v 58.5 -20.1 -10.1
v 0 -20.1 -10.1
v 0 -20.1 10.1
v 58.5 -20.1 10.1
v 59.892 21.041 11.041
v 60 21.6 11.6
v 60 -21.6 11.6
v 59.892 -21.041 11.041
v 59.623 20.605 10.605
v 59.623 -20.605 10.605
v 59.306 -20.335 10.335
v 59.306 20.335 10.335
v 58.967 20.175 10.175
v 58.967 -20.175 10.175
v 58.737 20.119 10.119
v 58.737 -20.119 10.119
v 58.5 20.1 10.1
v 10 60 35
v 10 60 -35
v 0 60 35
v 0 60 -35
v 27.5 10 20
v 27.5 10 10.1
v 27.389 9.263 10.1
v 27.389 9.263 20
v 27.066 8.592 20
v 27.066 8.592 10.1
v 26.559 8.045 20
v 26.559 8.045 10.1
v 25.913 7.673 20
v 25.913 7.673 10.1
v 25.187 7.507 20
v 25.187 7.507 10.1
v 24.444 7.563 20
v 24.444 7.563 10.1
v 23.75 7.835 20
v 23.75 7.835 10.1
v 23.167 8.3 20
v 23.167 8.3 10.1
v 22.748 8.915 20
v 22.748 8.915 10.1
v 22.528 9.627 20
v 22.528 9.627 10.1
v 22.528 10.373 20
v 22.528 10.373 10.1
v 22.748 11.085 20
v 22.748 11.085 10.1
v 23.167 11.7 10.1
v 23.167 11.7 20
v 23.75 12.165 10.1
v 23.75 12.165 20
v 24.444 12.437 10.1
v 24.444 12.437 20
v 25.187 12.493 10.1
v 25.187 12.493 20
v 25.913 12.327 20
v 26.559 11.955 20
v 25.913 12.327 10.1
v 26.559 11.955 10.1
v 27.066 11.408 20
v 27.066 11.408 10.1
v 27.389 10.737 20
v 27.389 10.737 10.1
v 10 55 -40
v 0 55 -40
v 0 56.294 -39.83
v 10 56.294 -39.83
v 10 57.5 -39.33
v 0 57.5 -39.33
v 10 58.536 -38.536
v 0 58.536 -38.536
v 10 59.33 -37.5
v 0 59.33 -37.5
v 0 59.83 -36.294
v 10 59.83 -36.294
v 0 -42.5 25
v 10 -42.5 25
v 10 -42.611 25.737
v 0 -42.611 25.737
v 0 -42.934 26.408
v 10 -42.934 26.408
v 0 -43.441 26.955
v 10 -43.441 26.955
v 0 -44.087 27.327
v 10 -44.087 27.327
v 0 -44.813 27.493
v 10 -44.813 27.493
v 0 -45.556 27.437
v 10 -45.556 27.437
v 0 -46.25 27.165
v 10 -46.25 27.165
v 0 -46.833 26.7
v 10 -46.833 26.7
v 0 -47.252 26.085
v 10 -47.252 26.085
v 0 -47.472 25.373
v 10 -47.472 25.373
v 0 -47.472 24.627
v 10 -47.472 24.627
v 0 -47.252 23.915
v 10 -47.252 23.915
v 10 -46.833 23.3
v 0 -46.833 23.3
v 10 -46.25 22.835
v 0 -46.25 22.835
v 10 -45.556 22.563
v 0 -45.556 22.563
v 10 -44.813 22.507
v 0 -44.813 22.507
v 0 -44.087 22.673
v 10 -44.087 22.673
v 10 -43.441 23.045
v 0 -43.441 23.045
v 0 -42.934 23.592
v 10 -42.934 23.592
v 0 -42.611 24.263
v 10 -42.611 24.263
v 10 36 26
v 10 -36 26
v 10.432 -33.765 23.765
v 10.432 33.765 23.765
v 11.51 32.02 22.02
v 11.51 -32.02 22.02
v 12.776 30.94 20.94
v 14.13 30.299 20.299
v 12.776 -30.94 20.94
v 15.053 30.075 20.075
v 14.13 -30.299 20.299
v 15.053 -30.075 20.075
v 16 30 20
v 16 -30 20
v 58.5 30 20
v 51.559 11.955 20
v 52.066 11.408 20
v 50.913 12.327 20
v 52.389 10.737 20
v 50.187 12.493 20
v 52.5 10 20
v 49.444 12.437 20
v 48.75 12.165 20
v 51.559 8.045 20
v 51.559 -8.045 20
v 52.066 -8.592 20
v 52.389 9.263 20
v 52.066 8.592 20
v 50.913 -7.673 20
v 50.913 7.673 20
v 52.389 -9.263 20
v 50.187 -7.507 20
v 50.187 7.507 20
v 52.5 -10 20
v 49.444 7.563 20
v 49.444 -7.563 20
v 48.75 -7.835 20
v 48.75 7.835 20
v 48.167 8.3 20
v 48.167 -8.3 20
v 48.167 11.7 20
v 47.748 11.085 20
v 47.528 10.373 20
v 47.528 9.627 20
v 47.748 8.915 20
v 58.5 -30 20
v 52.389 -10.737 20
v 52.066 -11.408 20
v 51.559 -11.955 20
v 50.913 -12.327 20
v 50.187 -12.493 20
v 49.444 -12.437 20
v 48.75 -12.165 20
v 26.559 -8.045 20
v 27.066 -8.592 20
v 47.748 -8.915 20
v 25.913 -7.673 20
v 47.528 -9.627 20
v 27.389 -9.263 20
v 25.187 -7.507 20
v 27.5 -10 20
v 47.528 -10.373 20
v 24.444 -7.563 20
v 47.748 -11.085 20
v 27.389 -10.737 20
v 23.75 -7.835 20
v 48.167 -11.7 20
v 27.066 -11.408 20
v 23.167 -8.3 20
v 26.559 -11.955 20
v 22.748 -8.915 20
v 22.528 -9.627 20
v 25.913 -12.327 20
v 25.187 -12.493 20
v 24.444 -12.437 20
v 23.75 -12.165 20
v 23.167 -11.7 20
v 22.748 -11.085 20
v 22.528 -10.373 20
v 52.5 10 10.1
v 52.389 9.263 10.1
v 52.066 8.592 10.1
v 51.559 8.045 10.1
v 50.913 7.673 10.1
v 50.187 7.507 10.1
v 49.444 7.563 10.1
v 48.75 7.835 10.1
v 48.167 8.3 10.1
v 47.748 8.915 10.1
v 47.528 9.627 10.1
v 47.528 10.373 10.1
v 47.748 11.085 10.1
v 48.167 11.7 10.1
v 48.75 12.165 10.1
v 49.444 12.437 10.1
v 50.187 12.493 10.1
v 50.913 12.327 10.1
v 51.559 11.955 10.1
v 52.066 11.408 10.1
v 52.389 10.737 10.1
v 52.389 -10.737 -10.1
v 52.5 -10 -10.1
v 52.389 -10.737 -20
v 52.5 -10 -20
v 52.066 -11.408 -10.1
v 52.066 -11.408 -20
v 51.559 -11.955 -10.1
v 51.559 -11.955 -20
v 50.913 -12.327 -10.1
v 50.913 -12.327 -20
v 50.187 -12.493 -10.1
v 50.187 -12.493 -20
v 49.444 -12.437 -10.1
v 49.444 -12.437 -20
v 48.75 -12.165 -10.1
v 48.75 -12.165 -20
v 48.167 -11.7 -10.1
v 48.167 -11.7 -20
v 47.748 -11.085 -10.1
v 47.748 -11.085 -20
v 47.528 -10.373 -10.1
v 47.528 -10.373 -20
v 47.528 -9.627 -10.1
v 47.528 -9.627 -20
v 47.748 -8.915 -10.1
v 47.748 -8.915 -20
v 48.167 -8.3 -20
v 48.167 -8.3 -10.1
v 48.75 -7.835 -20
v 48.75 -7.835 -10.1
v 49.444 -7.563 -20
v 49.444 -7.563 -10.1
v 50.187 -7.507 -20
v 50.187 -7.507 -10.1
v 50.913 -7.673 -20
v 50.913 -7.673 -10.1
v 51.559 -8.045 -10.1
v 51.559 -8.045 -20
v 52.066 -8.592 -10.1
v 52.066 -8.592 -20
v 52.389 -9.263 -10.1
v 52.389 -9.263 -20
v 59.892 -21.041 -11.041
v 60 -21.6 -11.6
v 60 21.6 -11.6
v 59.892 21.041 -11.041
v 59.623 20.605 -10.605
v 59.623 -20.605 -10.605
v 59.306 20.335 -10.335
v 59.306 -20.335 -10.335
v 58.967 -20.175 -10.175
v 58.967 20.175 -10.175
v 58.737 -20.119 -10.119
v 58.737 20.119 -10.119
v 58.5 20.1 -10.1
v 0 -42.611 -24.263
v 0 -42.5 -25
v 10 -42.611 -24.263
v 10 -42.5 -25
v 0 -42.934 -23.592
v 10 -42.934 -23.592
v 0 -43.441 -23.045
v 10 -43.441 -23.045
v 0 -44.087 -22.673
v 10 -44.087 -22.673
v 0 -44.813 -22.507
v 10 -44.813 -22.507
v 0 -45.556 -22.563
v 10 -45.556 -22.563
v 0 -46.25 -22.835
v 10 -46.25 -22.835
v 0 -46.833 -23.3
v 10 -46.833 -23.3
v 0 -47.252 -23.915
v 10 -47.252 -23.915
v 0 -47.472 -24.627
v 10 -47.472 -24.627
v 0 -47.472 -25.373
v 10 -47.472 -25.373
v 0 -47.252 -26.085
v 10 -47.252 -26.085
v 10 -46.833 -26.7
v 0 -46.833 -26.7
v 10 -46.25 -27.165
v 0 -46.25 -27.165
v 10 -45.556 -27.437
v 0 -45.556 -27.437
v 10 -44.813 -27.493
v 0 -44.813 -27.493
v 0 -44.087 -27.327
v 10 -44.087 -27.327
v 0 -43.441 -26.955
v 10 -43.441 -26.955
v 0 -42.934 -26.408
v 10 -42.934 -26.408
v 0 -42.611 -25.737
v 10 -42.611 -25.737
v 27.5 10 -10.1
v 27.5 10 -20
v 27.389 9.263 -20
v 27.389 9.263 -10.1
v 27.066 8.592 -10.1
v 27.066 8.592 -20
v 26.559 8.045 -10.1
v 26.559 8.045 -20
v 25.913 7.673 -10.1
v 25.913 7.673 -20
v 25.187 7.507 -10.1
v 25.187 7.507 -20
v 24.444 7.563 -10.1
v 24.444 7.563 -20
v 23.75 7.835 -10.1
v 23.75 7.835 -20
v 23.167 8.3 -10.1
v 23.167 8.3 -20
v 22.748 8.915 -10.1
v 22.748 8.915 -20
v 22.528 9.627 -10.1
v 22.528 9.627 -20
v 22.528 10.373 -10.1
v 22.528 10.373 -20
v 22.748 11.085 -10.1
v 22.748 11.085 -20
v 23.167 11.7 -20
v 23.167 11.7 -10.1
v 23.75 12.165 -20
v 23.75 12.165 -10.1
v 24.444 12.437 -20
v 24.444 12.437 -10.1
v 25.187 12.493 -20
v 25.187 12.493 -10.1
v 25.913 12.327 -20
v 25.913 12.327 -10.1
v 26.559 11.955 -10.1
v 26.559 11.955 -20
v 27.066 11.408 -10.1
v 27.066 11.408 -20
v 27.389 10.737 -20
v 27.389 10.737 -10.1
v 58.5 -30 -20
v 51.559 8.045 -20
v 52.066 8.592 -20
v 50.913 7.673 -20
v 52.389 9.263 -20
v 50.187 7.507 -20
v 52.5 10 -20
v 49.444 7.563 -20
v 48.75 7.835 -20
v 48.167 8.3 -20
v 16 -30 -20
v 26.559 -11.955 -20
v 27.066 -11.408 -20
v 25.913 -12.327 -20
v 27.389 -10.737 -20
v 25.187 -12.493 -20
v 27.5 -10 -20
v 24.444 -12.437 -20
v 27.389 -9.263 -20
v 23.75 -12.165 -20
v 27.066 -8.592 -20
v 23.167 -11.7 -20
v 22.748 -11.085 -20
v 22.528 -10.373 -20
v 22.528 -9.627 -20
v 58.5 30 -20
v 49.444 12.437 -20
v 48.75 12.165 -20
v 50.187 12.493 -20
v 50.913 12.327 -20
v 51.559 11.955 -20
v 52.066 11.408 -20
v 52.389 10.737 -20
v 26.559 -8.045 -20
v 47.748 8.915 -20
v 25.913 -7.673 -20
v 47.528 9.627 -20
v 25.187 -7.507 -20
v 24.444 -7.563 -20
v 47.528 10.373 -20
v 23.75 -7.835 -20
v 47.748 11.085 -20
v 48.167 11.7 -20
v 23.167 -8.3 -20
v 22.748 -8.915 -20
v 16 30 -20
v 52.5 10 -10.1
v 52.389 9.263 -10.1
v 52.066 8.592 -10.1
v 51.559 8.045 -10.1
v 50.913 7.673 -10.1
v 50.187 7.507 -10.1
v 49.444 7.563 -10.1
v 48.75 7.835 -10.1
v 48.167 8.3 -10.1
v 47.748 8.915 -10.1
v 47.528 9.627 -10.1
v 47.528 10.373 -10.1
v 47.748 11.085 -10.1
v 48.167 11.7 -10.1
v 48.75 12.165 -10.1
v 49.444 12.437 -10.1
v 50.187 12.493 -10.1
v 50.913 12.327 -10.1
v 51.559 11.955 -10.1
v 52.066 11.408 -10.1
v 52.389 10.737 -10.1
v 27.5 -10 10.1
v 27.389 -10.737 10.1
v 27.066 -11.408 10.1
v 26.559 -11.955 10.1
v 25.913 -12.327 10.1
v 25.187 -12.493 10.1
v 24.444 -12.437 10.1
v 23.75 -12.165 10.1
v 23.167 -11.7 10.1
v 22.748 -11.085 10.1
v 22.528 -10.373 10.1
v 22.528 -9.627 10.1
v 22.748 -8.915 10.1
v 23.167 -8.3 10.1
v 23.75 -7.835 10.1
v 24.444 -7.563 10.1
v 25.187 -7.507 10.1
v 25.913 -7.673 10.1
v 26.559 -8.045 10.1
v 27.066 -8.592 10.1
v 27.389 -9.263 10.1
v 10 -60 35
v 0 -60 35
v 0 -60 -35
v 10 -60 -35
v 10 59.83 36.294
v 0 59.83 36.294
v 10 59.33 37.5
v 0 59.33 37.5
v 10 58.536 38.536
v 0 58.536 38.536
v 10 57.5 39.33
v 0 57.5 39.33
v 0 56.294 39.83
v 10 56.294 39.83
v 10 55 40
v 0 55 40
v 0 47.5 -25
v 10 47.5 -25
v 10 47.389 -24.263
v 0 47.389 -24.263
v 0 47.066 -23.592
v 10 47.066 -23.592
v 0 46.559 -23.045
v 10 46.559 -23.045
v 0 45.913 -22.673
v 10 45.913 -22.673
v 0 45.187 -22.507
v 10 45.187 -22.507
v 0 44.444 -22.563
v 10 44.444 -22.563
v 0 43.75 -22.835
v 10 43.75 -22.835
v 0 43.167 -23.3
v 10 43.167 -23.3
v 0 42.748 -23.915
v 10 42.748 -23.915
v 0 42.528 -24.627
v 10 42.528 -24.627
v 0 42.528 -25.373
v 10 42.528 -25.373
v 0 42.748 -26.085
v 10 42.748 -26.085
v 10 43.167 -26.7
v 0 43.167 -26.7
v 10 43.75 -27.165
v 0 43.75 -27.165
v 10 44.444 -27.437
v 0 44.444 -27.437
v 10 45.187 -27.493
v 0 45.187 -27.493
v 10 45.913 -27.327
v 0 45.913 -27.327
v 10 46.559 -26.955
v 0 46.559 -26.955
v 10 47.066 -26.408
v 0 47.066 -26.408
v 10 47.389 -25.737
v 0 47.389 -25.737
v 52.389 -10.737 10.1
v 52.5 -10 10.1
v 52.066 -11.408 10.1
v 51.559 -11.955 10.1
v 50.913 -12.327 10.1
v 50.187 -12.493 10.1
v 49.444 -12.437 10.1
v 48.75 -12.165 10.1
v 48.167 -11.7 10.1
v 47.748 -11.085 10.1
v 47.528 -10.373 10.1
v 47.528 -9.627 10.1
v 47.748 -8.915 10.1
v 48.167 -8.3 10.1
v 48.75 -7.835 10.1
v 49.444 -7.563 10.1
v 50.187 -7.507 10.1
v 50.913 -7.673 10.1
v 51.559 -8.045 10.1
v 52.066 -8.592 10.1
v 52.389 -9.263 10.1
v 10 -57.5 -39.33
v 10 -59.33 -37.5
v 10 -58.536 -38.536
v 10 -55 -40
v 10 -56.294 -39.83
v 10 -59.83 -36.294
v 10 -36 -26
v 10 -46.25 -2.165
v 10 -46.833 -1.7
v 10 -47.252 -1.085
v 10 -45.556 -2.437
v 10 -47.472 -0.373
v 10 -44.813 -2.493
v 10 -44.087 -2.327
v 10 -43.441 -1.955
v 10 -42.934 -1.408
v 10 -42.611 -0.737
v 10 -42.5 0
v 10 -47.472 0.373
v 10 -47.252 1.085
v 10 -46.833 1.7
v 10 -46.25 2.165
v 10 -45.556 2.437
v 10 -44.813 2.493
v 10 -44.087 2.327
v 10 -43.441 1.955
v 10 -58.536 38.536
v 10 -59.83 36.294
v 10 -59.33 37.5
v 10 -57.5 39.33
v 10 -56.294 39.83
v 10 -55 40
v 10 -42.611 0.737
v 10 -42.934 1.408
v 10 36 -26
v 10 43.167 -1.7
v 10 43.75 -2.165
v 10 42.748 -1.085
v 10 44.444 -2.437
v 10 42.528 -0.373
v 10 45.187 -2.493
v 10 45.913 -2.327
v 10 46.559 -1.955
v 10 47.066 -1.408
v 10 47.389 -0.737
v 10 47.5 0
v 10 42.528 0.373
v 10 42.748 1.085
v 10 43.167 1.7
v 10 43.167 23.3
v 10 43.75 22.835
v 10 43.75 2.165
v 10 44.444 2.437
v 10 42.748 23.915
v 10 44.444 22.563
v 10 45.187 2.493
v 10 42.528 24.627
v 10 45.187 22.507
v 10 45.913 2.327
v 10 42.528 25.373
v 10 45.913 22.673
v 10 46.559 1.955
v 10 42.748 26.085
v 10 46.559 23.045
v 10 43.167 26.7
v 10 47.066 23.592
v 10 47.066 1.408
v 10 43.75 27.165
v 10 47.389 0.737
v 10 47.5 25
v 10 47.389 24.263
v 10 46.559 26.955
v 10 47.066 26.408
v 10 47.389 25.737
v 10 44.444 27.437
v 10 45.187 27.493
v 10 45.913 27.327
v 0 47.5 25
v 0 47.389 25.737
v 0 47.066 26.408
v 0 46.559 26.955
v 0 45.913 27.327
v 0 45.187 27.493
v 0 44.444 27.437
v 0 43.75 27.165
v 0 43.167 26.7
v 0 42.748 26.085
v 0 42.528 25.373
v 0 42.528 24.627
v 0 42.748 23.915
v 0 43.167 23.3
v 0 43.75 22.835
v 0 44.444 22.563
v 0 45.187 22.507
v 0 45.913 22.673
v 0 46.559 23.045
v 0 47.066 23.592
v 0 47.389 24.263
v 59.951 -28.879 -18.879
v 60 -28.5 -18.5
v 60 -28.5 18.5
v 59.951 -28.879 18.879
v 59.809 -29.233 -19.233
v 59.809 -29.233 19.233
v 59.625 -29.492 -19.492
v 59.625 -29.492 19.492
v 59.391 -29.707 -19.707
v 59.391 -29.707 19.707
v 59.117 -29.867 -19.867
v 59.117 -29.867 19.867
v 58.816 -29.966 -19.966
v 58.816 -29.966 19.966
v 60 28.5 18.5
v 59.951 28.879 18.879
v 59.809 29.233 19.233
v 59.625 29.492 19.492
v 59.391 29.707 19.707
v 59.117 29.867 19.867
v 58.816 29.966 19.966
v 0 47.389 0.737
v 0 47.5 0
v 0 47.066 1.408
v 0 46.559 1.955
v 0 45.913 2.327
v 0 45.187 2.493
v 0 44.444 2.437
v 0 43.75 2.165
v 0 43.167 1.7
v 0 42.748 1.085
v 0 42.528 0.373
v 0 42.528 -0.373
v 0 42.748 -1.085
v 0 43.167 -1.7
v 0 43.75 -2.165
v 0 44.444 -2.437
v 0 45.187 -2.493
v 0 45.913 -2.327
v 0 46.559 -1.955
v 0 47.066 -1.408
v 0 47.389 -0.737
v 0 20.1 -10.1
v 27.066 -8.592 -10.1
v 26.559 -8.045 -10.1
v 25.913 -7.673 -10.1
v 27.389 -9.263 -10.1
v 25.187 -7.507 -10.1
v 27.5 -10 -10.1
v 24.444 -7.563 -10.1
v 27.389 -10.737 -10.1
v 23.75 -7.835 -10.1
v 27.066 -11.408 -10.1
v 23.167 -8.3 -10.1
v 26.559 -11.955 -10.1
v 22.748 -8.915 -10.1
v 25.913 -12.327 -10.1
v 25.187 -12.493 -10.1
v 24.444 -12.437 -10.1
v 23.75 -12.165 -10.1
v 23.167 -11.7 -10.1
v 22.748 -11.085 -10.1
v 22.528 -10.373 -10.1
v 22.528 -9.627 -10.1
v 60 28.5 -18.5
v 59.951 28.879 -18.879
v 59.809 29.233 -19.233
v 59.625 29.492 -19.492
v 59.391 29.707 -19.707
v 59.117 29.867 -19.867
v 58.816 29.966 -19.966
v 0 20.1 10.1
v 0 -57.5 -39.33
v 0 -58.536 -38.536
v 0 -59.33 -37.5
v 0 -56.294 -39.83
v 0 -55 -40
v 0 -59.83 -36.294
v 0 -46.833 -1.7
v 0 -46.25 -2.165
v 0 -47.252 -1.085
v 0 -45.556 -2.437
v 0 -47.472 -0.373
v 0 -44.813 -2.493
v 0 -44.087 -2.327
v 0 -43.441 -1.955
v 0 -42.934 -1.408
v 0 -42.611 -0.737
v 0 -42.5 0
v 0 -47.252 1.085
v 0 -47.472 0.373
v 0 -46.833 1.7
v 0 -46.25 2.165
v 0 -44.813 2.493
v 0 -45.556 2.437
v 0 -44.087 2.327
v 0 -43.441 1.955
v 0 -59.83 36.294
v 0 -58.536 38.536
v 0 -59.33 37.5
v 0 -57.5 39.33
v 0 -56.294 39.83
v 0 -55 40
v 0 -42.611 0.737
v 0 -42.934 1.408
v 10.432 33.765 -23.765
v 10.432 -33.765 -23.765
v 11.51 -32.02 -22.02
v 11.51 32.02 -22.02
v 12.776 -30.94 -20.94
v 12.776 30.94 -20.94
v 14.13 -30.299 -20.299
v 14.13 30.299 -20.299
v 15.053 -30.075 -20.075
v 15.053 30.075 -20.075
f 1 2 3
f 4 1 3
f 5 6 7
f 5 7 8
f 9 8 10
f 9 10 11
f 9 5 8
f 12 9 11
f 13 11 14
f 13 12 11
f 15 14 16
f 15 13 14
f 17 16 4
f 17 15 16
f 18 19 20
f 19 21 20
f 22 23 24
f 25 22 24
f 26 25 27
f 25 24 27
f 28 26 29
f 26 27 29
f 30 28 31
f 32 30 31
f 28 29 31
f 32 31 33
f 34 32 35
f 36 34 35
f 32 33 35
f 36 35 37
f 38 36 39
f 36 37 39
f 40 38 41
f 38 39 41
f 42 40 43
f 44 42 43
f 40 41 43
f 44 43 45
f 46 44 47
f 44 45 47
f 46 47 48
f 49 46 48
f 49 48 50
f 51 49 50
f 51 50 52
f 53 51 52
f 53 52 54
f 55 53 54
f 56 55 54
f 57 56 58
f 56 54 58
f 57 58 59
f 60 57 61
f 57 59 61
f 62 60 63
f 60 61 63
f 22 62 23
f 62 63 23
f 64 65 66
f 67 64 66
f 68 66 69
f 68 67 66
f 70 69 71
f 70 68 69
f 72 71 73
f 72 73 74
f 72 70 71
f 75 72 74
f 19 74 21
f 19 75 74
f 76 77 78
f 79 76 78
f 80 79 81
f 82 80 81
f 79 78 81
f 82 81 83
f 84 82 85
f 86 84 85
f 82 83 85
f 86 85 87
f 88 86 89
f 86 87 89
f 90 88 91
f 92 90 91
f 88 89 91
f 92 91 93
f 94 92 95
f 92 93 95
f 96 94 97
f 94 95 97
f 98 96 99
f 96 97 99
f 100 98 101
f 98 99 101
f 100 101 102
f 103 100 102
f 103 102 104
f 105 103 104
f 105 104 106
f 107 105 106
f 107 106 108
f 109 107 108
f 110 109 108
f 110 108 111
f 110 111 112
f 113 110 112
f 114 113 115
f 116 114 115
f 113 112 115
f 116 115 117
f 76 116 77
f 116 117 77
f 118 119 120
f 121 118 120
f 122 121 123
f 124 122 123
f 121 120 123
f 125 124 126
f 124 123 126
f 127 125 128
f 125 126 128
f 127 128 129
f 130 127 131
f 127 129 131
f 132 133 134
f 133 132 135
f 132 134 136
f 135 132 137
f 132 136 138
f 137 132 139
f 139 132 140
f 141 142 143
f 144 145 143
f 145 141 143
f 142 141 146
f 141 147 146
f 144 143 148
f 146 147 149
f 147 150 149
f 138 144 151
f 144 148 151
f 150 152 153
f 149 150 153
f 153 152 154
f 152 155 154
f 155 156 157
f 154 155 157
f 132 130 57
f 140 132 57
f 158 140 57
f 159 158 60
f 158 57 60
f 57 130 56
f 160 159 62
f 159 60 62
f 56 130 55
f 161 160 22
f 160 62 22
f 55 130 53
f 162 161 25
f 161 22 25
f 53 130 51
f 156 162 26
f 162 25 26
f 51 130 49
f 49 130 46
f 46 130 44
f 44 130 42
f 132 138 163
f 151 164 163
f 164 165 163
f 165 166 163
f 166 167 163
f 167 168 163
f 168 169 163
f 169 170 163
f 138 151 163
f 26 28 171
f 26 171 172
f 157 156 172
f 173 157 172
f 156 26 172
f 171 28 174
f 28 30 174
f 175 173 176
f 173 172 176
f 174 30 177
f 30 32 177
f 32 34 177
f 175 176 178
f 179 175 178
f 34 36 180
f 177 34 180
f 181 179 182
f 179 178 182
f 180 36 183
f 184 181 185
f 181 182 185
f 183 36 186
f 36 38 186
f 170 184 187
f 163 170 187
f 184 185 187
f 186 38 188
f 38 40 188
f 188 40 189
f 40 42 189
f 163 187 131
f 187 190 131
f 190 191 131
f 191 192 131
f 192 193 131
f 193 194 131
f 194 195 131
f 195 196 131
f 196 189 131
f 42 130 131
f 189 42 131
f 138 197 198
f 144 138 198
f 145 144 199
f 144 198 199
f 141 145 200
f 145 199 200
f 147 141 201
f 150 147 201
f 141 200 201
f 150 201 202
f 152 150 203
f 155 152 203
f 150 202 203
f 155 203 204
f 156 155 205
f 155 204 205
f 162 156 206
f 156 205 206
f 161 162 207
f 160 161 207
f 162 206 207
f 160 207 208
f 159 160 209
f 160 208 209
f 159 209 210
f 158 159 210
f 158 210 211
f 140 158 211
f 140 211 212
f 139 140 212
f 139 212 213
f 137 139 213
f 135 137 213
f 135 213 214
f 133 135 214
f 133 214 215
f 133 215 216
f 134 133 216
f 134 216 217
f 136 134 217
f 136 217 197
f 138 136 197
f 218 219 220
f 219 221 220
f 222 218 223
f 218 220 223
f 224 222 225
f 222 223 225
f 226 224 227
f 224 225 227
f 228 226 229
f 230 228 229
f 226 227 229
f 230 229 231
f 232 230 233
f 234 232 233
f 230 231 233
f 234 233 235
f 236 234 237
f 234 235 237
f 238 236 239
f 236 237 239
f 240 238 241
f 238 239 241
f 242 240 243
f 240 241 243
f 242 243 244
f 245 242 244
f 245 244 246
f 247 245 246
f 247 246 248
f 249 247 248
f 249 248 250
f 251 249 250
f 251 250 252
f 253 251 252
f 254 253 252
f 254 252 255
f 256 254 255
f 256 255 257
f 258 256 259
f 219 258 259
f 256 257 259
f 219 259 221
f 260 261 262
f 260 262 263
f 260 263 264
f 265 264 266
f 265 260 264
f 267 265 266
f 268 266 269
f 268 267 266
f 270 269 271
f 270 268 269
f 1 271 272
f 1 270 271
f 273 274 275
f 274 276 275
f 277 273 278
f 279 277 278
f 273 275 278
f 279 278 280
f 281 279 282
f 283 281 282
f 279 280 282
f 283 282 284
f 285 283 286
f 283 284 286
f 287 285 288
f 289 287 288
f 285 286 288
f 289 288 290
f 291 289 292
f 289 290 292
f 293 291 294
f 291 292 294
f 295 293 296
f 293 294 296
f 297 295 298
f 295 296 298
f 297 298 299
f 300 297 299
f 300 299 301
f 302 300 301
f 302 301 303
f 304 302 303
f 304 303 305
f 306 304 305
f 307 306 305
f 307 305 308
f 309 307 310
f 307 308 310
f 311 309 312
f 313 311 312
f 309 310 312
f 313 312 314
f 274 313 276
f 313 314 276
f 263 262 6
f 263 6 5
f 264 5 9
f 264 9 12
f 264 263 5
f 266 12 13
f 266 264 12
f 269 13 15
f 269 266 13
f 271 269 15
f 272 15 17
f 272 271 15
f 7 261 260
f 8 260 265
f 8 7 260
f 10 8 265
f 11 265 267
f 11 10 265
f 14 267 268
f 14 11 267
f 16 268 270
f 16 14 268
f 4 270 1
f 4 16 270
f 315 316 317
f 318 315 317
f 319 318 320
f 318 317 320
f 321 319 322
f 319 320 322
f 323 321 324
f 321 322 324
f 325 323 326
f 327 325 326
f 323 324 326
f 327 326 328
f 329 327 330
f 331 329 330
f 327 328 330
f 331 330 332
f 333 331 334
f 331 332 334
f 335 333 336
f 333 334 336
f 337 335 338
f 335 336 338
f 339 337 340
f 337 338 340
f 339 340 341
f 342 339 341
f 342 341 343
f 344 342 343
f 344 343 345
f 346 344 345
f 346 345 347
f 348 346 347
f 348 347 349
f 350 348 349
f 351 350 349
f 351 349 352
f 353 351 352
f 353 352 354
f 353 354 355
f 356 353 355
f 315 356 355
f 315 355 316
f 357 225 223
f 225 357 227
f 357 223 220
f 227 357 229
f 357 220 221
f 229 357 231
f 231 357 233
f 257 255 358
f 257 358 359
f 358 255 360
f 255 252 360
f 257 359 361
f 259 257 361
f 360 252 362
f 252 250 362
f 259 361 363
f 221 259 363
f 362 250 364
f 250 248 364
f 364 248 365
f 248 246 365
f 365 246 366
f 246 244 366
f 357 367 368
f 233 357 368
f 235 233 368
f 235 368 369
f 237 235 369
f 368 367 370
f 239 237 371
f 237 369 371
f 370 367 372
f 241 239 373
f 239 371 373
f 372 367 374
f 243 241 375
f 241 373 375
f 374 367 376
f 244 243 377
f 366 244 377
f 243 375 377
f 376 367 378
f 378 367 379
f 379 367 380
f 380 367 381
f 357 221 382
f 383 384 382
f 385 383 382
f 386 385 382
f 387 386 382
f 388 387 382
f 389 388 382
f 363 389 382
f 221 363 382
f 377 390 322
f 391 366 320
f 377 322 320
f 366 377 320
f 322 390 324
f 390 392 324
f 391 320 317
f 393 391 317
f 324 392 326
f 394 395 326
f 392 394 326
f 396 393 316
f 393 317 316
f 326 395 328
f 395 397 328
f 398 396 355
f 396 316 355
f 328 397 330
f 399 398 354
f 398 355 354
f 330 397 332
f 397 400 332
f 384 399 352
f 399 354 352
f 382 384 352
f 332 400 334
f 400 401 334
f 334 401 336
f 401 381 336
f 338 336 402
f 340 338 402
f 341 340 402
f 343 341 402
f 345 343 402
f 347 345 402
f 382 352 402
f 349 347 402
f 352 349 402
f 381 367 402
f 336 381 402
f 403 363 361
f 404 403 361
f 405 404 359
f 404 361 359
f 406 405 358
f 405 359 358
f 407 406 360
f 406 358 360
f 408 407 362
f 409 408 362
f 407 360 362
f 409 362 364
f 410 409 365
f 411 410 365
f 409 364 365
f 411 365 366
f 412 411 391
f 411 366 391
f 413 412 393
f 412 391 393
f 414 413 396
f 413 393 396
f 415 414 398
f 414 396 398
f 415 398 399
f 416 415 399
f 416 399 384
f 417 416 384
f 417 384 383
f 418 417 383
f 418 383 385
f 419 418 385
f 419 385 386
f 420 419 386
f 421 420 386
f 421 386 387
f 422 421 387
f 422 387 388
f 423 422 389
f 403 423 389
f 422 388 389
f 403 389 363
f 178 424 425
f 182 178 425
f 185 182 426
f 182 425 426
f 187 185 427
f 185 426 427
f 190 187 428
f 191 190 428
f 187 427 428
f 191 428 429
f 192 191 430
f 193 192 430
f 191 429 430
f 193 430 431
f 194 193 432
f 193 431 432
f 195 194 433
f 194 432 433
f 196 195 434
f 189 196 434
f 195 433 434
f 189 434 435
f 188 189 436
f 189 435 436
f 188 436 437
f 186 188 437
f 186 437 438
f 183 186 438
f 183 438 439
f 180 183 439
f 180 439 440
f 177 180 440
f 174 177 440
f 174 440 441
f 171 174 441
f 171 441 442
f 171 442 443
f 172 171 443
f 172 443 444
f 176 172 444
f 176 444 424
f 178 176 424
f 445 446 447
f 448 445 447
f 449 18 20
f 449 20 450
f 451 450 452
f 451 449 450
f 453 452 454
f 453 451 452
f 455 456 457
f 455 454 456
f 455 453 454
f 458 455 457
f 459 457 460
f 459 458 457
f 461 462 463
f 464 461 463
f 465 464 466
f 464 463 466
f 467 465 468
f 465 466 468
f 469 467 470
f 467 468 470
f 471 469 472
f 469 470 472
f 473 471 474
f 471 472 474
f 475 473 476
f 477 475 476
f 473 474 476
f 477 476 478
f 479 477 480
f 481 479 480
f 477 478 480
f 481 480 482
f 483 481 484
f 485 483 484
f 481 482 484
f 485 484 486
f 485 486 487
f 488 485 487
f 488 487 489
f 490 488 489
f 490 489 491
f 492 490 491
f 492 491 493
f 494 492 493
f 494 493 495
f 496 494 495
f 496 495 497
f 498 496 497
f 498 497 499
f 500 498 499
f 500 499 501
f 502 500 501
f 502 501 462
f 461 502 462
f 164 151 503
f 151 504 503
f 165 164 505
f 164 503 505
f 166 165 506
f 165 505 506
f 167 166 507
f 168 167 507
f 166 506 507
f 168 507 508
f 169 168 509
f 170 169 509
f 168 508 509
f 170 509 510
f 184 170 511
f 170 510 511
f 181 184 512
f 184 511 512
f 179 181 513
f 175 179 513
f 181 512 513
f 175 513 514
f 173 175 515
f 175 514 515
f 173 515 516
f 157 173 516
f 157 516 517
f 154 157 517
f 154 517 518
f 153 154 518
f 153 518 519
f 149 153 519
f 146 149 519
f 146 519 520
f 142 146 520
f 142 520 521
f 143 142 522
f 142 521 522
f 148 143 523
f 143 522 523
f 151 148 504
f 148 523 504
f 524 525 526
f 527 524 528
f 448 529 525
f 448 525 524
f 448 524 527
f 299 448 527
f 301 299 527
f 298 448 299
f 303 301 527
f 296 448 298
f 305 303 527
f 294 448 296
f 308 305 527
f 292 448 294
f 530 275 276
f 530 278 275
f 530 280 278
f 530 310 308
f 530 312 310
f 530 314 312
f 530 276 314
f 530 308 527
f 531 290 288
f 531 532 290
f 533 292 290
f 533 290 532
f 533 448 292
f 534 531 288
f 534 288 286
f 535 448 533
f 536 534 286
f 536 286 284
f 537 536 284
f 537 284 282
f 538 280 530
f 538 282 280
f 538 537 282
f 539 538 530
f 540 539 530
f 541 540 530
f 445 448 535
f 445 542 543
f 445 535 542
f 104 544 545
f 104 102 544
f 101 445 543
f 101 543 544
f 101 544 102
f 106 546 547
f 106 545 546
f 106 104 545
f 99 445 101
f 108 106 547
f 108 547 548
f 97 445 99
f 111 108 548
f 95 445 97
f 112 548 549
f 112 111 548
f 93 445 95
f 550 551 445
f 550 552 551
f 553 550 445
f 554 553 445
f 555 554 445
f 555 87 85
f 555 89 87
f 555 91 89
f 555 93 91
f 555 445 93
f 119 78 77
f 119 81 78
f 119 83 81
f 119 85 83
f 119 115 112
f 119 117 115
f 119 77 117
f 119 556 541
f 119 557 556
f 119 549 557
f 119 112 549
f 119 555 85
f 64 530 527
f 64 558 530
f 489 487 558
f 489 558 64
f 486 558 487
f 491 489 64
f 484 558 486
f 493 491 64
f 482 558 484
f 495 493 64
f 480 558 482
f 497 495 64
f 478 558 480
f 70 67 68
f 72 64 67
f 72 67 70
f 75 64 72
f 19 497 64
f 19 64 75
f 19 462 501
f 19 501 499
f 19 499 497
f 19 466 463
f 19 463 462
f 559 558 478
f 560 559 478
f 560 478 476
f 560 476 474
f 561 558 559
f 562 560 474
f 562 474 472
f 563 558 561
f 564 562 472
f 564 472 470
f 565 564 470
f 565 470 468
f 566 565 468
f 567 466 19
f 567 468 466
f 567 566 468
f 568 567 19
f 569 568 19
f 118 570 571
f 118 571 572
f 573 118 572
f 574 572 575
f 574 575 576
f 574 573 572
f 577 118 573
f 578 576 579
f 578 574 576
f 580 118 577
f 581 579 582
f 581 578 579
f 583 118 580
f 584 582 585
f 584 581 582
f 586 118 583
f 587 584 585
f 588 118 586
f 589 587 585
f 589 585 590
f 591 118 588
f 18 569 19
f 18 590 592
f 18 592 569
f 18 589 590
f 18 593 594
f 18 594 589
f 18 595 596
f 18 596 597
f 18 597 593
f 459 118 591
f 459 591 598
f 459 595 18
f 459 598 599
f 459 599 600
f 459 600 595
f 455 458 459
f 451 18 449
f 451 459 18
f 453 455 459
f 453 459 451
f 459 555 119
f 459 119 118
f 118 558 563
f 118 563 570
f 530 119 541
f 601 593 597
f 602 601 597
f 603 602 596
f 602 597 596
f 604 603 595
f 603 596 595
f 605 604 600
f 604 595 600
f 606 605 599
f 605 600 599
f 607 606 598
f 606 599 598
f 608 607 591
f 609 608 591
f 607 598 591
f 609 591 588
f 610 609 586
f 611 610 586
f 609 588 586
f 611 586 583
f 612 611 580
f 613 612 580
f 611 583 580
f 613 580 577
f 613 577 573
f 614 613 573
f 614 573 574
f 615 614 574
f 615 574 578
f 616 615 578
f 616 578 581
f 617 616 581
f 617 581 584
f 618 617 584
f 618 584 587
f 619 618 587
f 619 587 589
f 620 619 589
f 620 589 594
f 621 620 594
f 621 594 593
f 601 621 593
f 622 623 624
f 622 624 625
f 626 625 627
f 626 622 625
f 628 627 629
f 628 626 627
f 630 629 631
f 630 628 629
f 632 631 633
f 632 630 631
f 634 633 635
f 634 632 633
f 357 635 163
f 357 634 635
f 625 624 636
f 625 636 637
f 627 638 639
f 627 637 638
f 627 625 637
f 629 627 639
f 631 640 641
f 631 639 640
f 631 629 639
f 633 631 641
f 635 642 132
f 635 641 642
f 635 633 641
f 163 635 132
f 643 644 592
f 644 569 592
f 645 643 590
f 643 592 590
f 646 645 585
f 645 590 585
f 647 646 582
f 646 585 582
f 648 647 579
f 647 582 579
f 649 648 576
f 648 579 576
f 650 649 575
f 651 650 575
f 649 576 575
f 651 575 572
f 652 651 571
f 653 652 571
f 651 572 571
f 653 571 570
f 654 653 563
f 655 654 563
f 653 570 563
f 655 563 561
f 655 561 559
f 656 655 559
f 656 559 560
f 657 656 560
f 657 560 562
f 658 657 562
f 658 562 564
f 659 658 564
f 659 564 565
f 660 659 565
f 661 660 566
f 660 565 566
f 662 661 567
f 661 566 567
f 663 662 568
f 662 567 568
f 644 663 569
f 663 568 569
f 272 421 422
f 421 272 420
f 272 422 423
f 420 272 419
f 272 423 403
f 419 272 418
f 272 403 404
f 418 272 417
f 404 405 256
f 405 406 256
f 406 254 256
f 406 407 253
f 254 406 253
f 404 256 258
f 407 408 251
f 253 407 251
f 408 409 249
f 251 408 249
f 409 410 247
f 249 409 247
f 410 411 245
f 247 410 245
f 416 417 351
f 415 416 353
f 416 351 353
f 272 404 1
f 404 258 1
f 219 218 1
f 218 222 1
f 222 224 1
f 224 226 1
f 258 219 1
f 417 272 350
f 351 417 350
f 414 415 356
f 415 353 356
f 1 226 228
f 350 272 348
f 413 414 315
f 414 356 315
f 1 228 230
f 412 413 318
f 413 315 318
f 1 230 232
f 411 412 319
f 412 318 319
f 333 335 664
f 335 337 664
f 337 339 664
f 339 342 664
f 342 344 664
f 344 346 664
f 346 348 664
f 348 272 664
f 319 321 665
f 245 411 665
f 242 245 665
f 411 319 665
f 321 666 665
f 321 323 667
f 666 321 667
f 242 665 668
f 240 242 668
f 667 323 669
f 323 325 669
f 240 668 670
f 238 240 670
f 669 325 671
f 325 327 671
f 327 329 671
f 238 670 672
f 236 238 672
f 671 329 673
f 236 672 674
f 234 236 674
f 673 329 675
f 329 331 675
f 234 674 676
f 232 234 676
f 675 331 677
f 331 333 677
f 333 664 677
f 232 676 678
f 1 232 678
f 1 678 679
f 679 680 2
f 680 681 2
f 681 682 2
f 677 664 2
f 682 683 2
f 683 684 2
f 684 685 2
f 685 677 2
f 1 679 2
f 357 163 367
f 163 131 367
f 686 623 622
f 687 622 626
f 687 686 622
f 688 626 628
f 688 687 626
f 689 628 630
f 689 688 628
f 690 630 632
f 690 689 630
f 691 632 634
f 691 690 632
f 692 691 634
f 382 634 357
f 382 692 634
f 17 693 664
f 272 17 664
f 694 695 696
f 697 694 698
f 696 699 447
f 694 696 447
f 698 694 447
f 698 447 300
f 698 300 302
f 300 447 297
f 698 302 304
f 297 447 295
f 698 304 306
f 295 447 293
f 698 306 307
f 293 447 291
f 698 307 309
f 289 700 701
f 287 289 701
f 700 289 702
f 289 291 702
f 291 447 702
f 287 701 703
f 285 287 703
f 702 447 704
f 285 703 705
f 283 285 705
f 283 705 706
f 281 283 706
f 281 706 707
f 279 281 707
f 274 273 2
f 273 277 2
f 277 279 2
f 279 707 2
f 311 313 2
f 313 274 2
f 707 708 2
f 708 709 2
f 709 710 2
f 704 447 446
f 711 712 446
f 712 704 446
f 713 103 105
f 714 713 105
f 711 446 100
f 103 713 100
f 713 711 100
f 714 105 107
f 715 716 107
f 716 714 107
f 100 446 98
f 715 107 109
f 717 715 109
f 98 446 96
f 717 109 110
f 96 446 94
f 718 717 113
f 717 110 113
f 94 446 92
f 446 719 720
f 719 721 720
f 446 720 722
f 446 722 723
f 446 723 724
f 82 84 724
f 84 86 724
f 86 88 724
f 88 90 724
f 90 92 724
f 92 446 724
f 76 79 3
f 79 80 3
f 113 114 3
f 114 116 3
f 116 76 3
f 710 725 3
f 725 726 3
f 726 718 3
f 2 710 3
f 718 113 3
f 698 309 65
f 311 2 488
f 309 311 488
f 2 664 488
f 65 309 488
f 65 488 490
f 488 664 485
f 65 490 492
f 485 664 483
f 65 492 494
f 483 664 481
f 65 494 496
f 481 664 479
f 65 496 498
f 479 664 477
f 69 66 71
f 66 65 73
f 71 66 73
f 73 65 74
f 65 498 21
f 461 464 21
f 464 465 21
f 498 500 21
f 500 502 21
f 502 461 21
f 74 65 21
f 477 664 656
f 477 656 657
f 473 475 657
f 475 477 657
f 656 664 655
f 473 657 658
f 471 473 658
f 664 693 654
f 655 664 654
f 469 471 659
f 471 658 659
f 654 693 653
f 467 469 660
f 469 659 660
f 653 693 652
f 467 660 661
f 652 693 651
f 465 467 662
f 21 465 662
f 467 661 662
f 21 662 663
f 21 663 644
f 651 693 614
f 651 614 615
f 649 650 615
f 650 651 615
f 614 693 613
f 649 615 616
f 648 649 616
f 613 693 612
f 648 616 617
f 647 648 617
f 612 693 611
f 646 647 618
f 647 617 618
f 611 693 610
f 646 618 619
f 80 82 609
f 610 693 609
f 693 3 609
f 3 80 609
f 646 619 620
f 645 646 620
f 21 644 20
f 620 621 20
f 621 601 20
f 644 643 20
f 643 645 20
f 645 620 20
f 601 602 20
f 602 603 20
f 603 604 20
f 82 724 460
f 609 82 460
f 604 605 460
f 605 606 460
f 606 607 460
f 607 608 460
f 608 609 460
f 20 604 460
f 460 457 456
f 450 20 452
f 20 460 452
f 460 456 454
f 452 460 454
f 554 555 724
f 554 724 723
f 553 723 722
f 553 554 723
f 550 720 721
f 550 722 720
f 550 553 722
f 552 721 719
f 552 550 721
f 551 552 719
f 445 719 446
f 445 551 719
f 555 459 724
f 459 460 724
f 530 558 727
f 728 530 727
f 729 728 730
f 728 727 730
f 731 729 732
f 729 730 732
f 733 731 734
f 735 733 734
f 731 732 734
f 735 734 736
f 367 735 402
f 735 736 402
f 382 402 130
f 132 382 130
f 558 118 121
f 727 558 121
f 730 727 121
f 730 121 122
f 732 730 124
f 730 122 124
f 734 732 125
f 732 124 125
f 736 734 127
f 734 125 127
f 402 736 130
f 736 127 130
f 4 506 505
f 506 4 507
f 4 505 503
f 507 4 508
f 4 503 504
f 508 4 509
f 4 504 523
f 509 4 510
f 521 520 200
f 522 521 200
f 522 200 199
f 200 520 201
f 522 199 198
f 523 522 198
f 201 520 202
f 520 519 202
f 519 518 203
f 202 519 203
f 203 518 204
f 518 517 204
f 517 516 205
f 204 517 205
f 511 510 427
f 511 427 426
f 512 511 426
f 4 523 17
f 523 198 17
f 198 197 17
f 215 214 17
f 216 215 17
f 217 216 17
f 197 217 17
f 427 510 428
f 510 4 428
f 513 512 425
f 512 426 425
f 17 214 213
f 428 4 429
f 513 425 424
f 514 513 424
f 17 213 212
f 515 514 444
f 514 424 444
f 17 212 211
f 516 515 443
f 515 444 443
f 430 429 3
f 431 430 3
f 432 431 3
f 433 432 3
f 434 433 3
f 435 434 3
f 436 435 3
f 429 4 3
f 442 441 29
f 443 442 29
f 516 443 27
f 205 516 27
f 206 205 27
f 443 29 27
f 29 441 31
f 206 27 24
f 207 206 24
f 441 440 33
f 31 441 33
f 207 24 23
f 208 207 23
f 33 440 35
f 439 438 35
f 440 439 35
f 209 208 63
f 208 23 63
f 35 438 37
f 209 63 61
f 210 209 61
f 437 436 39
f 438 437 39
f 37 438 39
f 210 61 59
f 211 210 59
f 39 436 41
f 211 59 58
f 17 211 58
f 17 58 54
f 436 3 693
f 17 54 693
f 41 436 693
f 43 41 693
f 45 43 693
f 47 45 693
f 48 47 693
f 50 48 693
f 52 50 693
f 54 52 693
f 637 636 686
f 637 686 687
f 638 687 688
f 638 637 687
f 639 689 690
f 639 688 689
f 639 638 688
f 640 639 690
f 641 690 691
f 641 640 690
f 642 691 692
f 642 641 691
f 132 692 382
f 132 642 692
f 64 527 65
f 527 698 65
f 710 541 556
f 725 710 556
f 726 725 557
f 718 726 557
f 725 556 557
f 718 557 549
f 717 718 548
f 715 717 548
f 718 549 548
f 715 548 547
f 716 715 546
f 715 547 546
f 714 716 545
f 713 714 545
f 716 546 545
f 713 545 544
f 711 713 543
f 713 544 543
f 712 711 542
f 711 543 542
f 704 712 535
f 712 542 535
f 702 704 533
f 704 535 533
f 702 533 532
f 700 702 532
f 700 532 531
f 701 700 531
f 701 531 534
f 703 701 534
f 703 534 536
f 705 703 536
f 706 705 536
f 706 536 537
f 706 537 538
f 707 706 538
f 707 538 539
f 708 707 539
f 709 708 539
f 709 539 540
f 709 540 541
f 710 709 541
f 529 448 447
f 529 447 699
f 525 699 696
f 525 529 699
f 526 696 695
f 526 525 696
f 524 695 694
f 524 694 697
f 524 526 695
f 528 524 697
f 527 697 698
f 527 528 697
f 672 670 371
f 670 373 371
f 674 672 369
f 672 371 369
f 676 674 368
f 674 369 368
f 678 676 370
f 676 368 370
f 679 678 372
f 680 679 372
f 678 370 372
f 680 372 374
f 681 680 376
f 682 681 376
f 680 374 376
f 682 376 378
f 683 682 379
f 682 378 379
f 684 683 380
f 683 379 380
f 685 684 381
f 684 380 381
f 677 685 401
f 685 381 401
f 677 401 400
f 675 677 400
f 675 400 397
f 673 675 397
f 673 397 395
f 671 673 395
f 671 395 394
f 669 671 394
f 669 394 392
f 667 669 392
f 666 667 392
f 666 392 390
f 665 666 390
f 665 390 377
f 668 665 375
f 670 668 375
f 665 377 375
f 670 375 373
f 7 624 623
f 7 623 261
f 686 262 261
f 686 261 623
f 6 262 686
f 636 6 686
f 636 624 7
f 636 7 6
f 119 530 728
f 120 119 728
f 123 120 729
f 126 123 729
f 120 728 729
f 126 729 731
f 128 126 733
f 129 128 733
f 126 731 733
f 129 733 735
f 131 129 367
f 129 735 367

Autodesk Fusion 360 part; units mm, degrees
sketch "Schizzo1" plane through (0, 0, 0) normal (1, 0, 0) x (0, 1, 0)
  line L0 (20.1, -10.1) -> (-20.1, -10.1)
  line L1 (-20.1, -10.1) -> (-20.1, 10.1)
  line L2 (-20.1, 10.1) -> (20.1, 10.1)
  line L3 (20.1, 10.1) -> (20.1, -10.1)
  line L4 (20.1, -10.1) -> (-20.1, 10.1) construction
  line L5 (-20.1, -10.1) -> (20.1, 10.1) construction
  line L6 (-60, -40) -> (60, -40)
  line L7 (60, -40) -> (60, 40)
  line L8 (60, 40) -> (-60, 40)
  line L9 (-60, 40) -> (-60, -40)
  line L10 (-60, -40) -> (60, 40) construction
  line L11 (60, -40) -> (-60, 40) construction
  dimension "d1" = 40.2
  dimension "d2" = 20.2
  dimension "d3" = 120
  dimension "d4" = 80
extrude "Estrusione1" add sketch "Schizzo1" along normal blind 10
sketch "Schizzo2" plane through (10, 0, 0) normal (1, 0, 0) x (0, 1, 0)
  line L0 (-20.1, 10.1) -> (20.1, 10.1)
  line L1 (20.1, 10.1) -> (20.1, -10.1)
  line L2 (20.1, -10.1) -> (-20.1, -10.1)
  line L3 (-20.1, -10.1) -> (-20.1, 10.1)
  line L4 (-60, 40) -> (-60, -40)
  line L5 (-60, -40) -> (60, -40)
  line L6 (60, -40) -> (60, 40)
  line L7 (60, 40) -> (-60, 40)
  line L8 (-20.1, -10.1) -> (20.1, -10.1)
  line L9 (20.1, -10.1) -> (20.1, 10.1)
  line L10 (20.1, 10.1) -> (-20.1, 10.1)
  line L11 (-20.1, 10.1) -> (-20.1, -10.1)
  line L12 (-20.1, -10.1) -> (20.1, 10.1) construction
  line L13 (20.1, -10.1) -> (-20.1, 10.1) construction
  line L14 (-30, -20) -> (30, -20)
  line L15 (30, -20) -> (30, 20)
  line L16 (30, 20) -> (-30, 20)
  line L17 (-30, 20) -> (-30, -20)
  line L18 (-30, -20) -> (30, 20) construction
  line L19 (30, -20) -> (-30, 20) construction
  dimension "d7" = 60
  dimension "d8" = 40
extrude "Estrusione2" add sketch "Schizzo2" along normal blind 50 contours L14 L15 L16 L17
sketch "Schizzo3" plane through (0, 0, -20) normal (0, 0, -1) x (1, 0, 0)
  line L0 (10, 30) -> (10, -30)
  line L1 (10, -30) -> (60, -30)
  line L2 (60, -30) -> (60, 30)
  line L3 (60, 30) -> (10, 30)
  line L4 (60, 0) -> (0, 0) construction
  line L5 (60, -10) -> (0, -10) construction
  circle A0 centre (50, -10) radius 2.5
  circle A1 centre (25, -10) radius 2.5
  circle A2 centre (50, 10) radius 2.5
  circle A3 centre (25, 10) radius 2.5
  point P0 (35, -10)
  dimension "d11" = 10
  dimension "d12" = 5
  dimension "d13" = 5
  dimension "d14" = 25
  dimension "d15" = 15
  dimension "d16" = 25
extrude "Estrusione3" cut sketch "Schizzo3" against normal blind 43 contours A0 | A1 | A2 | A3
sketch "Schizzo4" plane through (10, 0, 0) normal (1, 0, 0) x (0, 1, 0)
  line L0 (-30, 20) -> (30, 20)
  line L1 (30, 20) -> (30, -20)
  line L2 (30, -20) -> (-30, -20)
  line L3 (-30, -20) -> (-30, 20)
  line L4 (-60, 40) -> (-60, -40)
  line L5 (-60, -40) -> (60, -40)
  line L6 (60, -40) -> (60, 40)
  line L7 (60, 40) -> (-60, 40)
  line L8 (0, 40) -> (0, -40) construction
  line L9 (45, -40) -> (45, 40)
  circle A0 centre (45, 0) radius 2.5
  circle A1 centre (45, -25) radius 2.5
  circle A2 centre (45, 25) radius 2.5
  circle A3 centre (-45, -25) radius 2.5
  circle A4 centre (-45, 0) radius 2.5
  circle A5 centre (-45, 25) radius 2.5
  dimension "d19" = 5
  dimension "d20" = 5
  dimension "d21" = 5
  dimension "d22" = 25
  dimension "d23" = 25
extrude "Estrusione4" cut sketch "Schizzo4" against normal blind 25 contours L9 A2 | L9 A2 | L9 A1 | L9 A1 | L9 A0 | L9 A0 | A3 | A4 | A5
fillet "Raccordo1" radius 5 4 edges at (5, 60, -40) (5, 60, 40) (5, -60, 40) (5, -60, -40)
fillet "Raccordo2" radius 6 4 edges at (10, 0, 20) (10, -30, 0) (10, 30, 0) (10, 0, -20)
fillet "Raccordo3" radius 1.5 8 edges at (60, 20.1, 0) (60, 0, -10.1) (60, 0, 10.1) (60, -20.1, 0) (60, -30, 0) (60, 0, 20) (60, 30, 0) (60, 0, -20)
